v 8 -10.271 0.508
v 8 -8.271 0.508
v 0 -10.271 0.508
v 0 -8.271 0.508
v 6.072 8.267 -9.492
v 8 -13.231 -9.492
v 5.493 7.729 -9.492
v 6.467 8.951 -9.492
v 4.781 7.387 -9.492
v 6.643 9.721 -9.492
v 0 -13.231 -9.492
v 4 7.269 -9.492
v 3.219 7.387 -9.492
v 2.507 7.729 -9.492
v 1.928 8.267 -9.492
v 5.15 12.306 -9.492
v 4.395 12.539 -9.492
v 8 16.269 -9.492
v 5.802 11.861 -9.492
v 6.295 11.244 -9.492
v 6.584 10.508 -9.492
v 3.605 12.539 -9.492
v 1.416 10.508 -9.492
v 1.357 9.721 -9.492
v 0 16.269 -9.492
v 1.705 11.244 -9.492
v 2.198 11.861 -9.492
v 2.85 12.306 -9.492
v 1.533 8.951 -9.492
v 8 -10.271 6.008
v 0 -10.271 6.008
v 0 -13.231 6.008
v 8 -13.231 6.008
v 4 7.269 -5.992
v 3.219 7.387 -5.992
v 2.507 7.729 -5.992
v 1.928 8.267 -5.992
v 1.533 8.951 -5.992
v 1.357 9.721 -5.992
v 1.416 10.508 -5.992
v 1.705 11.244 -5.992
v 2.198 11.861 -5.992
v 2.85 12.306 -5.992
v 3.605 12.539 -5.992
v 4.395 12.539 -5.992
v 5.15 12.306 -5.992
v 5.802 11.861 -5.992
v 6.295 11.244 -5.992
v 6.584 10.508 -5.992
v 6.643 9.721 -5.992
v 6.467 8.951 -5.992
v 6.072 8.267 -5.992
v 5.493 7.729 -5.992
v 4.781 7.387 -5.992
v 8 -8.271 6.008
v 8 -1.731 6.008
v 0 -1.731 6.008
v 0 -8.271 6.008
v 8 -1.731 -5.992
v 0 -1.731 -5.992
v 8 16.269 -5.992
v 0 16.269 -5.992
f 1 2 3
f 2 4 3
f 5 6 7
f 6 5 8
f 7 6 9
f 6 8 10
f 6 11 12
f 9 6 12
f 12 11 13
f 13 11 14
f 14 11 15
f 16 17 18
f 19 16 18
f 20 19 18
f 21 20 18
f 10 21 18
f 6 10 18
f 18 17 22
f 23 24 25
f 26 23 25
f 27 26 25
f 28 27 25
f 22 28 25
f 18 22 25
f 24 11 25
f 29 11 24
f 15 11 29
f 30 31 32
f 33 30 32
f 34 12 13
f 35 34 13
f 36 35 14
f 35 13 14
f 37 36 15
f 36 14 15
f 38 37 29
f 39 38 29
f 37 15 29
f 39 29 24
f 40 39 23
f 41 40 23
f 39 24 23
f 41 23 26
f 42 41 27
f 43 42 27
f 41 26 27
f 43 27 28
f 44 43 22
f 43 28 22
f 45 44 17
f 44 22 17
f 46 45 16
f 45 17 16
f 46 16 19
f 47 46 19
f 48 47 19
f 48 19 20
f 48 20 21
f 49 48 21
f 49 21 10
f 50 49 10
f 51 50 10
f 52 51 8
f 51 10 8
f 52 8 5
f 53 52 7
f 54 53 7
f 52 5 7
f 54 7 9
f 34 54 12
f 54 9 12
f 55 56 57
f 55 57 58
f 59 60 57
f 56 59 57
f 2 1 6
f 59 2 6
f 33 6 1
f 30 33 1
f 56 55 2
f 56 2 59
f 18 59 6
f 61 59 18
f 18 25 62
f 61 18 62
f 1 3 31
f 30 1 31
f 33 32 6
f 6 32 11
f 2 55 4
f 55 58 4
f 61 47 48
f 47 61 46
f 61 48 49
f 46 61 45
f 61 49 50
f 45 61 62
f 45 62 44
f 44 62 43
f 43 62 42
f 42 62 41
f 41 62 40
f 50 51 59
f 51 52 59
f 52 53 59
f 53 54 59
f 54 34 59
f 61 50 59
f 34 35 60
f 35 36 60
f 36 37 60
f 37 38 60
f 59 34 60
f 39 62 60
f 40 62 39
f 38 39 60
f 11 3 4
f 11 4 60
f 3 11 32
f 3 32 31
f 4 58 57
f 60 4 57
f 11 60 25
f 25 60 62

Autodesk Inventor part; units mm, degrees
ref_plane "YZ Plane" through (0, 0, 0) normal (1, 0, 0) x (0, 1, 0)
ref_plane "XZ Plane" through (0, 0, 0) normal (0, 1, 0) x (-1, 0, 0)
ref_plane "XY Plane" through (0, 0, 0) normal (0, 0, 1) x (1, 0, 0)
sketch "Sketch2" plane through (0, 0, 0) normal (1, 0, 0) x (0, 1, 0)
  line L0 (-8.2712, 6.008) -> (-8.2712, 0.508)
  line L1 (-8.2712, 0.508) -> (-10.2712, 0.508)
  line L2 (-10.2712, 0.508) -> (-10.2712, 6.008)
  line L3 (-10.2712, 6.008) -> (-13.2312, 6.008)
  line L4 (-13.2312, 6.008) -> (-13.2312, -9.492)
  line L5 (-13.2312, -9.492) -> (16.2688, -9.492)
  line L6 (16.2688, -5.992) -> (-1.7312, -5.992)
  line L7 (-1.7312, -5.992) -> (-1.7312, 6.008)
  line L8 (16.2688, -9.492) -> (16.2688, -5.992)
  line L9 (-1.7312, 6.008) -> (-8.2712, 6.008)
  point P0 (0, 0)
  dimension "d2" = 2
  dimension "d3" = 5.5
  dimension "d4" = 15.5
  dimension "d9" = 12
  dimension "d10" = 29.5
  dimension "d11" = 24.54
  dimension "d12" = 18
  dimension "d22" = 3.5
extrude "Extrusion1" add sketch "Sketch2" along normal blind 8
sketch "Sketch3" plane through (0, -1.7312, -5.992) normal (0, 0, 1) x (1, 0, 0)
  line L0 (0, 18) -> (8, 18) projected
  line L1 (0, 0) -> (0, 18) projected
  point P0 (0, 1.7312)
  point P1 (4, 11.65)
  dimension "d13" = 6.35
  dimension "d14" = 4
hole "Hole1" at (4, 9.9188, -5.992) direction (0, 0, -1) diameter 5.3 depth 8 tip angle 118
properties part number "grip1"
